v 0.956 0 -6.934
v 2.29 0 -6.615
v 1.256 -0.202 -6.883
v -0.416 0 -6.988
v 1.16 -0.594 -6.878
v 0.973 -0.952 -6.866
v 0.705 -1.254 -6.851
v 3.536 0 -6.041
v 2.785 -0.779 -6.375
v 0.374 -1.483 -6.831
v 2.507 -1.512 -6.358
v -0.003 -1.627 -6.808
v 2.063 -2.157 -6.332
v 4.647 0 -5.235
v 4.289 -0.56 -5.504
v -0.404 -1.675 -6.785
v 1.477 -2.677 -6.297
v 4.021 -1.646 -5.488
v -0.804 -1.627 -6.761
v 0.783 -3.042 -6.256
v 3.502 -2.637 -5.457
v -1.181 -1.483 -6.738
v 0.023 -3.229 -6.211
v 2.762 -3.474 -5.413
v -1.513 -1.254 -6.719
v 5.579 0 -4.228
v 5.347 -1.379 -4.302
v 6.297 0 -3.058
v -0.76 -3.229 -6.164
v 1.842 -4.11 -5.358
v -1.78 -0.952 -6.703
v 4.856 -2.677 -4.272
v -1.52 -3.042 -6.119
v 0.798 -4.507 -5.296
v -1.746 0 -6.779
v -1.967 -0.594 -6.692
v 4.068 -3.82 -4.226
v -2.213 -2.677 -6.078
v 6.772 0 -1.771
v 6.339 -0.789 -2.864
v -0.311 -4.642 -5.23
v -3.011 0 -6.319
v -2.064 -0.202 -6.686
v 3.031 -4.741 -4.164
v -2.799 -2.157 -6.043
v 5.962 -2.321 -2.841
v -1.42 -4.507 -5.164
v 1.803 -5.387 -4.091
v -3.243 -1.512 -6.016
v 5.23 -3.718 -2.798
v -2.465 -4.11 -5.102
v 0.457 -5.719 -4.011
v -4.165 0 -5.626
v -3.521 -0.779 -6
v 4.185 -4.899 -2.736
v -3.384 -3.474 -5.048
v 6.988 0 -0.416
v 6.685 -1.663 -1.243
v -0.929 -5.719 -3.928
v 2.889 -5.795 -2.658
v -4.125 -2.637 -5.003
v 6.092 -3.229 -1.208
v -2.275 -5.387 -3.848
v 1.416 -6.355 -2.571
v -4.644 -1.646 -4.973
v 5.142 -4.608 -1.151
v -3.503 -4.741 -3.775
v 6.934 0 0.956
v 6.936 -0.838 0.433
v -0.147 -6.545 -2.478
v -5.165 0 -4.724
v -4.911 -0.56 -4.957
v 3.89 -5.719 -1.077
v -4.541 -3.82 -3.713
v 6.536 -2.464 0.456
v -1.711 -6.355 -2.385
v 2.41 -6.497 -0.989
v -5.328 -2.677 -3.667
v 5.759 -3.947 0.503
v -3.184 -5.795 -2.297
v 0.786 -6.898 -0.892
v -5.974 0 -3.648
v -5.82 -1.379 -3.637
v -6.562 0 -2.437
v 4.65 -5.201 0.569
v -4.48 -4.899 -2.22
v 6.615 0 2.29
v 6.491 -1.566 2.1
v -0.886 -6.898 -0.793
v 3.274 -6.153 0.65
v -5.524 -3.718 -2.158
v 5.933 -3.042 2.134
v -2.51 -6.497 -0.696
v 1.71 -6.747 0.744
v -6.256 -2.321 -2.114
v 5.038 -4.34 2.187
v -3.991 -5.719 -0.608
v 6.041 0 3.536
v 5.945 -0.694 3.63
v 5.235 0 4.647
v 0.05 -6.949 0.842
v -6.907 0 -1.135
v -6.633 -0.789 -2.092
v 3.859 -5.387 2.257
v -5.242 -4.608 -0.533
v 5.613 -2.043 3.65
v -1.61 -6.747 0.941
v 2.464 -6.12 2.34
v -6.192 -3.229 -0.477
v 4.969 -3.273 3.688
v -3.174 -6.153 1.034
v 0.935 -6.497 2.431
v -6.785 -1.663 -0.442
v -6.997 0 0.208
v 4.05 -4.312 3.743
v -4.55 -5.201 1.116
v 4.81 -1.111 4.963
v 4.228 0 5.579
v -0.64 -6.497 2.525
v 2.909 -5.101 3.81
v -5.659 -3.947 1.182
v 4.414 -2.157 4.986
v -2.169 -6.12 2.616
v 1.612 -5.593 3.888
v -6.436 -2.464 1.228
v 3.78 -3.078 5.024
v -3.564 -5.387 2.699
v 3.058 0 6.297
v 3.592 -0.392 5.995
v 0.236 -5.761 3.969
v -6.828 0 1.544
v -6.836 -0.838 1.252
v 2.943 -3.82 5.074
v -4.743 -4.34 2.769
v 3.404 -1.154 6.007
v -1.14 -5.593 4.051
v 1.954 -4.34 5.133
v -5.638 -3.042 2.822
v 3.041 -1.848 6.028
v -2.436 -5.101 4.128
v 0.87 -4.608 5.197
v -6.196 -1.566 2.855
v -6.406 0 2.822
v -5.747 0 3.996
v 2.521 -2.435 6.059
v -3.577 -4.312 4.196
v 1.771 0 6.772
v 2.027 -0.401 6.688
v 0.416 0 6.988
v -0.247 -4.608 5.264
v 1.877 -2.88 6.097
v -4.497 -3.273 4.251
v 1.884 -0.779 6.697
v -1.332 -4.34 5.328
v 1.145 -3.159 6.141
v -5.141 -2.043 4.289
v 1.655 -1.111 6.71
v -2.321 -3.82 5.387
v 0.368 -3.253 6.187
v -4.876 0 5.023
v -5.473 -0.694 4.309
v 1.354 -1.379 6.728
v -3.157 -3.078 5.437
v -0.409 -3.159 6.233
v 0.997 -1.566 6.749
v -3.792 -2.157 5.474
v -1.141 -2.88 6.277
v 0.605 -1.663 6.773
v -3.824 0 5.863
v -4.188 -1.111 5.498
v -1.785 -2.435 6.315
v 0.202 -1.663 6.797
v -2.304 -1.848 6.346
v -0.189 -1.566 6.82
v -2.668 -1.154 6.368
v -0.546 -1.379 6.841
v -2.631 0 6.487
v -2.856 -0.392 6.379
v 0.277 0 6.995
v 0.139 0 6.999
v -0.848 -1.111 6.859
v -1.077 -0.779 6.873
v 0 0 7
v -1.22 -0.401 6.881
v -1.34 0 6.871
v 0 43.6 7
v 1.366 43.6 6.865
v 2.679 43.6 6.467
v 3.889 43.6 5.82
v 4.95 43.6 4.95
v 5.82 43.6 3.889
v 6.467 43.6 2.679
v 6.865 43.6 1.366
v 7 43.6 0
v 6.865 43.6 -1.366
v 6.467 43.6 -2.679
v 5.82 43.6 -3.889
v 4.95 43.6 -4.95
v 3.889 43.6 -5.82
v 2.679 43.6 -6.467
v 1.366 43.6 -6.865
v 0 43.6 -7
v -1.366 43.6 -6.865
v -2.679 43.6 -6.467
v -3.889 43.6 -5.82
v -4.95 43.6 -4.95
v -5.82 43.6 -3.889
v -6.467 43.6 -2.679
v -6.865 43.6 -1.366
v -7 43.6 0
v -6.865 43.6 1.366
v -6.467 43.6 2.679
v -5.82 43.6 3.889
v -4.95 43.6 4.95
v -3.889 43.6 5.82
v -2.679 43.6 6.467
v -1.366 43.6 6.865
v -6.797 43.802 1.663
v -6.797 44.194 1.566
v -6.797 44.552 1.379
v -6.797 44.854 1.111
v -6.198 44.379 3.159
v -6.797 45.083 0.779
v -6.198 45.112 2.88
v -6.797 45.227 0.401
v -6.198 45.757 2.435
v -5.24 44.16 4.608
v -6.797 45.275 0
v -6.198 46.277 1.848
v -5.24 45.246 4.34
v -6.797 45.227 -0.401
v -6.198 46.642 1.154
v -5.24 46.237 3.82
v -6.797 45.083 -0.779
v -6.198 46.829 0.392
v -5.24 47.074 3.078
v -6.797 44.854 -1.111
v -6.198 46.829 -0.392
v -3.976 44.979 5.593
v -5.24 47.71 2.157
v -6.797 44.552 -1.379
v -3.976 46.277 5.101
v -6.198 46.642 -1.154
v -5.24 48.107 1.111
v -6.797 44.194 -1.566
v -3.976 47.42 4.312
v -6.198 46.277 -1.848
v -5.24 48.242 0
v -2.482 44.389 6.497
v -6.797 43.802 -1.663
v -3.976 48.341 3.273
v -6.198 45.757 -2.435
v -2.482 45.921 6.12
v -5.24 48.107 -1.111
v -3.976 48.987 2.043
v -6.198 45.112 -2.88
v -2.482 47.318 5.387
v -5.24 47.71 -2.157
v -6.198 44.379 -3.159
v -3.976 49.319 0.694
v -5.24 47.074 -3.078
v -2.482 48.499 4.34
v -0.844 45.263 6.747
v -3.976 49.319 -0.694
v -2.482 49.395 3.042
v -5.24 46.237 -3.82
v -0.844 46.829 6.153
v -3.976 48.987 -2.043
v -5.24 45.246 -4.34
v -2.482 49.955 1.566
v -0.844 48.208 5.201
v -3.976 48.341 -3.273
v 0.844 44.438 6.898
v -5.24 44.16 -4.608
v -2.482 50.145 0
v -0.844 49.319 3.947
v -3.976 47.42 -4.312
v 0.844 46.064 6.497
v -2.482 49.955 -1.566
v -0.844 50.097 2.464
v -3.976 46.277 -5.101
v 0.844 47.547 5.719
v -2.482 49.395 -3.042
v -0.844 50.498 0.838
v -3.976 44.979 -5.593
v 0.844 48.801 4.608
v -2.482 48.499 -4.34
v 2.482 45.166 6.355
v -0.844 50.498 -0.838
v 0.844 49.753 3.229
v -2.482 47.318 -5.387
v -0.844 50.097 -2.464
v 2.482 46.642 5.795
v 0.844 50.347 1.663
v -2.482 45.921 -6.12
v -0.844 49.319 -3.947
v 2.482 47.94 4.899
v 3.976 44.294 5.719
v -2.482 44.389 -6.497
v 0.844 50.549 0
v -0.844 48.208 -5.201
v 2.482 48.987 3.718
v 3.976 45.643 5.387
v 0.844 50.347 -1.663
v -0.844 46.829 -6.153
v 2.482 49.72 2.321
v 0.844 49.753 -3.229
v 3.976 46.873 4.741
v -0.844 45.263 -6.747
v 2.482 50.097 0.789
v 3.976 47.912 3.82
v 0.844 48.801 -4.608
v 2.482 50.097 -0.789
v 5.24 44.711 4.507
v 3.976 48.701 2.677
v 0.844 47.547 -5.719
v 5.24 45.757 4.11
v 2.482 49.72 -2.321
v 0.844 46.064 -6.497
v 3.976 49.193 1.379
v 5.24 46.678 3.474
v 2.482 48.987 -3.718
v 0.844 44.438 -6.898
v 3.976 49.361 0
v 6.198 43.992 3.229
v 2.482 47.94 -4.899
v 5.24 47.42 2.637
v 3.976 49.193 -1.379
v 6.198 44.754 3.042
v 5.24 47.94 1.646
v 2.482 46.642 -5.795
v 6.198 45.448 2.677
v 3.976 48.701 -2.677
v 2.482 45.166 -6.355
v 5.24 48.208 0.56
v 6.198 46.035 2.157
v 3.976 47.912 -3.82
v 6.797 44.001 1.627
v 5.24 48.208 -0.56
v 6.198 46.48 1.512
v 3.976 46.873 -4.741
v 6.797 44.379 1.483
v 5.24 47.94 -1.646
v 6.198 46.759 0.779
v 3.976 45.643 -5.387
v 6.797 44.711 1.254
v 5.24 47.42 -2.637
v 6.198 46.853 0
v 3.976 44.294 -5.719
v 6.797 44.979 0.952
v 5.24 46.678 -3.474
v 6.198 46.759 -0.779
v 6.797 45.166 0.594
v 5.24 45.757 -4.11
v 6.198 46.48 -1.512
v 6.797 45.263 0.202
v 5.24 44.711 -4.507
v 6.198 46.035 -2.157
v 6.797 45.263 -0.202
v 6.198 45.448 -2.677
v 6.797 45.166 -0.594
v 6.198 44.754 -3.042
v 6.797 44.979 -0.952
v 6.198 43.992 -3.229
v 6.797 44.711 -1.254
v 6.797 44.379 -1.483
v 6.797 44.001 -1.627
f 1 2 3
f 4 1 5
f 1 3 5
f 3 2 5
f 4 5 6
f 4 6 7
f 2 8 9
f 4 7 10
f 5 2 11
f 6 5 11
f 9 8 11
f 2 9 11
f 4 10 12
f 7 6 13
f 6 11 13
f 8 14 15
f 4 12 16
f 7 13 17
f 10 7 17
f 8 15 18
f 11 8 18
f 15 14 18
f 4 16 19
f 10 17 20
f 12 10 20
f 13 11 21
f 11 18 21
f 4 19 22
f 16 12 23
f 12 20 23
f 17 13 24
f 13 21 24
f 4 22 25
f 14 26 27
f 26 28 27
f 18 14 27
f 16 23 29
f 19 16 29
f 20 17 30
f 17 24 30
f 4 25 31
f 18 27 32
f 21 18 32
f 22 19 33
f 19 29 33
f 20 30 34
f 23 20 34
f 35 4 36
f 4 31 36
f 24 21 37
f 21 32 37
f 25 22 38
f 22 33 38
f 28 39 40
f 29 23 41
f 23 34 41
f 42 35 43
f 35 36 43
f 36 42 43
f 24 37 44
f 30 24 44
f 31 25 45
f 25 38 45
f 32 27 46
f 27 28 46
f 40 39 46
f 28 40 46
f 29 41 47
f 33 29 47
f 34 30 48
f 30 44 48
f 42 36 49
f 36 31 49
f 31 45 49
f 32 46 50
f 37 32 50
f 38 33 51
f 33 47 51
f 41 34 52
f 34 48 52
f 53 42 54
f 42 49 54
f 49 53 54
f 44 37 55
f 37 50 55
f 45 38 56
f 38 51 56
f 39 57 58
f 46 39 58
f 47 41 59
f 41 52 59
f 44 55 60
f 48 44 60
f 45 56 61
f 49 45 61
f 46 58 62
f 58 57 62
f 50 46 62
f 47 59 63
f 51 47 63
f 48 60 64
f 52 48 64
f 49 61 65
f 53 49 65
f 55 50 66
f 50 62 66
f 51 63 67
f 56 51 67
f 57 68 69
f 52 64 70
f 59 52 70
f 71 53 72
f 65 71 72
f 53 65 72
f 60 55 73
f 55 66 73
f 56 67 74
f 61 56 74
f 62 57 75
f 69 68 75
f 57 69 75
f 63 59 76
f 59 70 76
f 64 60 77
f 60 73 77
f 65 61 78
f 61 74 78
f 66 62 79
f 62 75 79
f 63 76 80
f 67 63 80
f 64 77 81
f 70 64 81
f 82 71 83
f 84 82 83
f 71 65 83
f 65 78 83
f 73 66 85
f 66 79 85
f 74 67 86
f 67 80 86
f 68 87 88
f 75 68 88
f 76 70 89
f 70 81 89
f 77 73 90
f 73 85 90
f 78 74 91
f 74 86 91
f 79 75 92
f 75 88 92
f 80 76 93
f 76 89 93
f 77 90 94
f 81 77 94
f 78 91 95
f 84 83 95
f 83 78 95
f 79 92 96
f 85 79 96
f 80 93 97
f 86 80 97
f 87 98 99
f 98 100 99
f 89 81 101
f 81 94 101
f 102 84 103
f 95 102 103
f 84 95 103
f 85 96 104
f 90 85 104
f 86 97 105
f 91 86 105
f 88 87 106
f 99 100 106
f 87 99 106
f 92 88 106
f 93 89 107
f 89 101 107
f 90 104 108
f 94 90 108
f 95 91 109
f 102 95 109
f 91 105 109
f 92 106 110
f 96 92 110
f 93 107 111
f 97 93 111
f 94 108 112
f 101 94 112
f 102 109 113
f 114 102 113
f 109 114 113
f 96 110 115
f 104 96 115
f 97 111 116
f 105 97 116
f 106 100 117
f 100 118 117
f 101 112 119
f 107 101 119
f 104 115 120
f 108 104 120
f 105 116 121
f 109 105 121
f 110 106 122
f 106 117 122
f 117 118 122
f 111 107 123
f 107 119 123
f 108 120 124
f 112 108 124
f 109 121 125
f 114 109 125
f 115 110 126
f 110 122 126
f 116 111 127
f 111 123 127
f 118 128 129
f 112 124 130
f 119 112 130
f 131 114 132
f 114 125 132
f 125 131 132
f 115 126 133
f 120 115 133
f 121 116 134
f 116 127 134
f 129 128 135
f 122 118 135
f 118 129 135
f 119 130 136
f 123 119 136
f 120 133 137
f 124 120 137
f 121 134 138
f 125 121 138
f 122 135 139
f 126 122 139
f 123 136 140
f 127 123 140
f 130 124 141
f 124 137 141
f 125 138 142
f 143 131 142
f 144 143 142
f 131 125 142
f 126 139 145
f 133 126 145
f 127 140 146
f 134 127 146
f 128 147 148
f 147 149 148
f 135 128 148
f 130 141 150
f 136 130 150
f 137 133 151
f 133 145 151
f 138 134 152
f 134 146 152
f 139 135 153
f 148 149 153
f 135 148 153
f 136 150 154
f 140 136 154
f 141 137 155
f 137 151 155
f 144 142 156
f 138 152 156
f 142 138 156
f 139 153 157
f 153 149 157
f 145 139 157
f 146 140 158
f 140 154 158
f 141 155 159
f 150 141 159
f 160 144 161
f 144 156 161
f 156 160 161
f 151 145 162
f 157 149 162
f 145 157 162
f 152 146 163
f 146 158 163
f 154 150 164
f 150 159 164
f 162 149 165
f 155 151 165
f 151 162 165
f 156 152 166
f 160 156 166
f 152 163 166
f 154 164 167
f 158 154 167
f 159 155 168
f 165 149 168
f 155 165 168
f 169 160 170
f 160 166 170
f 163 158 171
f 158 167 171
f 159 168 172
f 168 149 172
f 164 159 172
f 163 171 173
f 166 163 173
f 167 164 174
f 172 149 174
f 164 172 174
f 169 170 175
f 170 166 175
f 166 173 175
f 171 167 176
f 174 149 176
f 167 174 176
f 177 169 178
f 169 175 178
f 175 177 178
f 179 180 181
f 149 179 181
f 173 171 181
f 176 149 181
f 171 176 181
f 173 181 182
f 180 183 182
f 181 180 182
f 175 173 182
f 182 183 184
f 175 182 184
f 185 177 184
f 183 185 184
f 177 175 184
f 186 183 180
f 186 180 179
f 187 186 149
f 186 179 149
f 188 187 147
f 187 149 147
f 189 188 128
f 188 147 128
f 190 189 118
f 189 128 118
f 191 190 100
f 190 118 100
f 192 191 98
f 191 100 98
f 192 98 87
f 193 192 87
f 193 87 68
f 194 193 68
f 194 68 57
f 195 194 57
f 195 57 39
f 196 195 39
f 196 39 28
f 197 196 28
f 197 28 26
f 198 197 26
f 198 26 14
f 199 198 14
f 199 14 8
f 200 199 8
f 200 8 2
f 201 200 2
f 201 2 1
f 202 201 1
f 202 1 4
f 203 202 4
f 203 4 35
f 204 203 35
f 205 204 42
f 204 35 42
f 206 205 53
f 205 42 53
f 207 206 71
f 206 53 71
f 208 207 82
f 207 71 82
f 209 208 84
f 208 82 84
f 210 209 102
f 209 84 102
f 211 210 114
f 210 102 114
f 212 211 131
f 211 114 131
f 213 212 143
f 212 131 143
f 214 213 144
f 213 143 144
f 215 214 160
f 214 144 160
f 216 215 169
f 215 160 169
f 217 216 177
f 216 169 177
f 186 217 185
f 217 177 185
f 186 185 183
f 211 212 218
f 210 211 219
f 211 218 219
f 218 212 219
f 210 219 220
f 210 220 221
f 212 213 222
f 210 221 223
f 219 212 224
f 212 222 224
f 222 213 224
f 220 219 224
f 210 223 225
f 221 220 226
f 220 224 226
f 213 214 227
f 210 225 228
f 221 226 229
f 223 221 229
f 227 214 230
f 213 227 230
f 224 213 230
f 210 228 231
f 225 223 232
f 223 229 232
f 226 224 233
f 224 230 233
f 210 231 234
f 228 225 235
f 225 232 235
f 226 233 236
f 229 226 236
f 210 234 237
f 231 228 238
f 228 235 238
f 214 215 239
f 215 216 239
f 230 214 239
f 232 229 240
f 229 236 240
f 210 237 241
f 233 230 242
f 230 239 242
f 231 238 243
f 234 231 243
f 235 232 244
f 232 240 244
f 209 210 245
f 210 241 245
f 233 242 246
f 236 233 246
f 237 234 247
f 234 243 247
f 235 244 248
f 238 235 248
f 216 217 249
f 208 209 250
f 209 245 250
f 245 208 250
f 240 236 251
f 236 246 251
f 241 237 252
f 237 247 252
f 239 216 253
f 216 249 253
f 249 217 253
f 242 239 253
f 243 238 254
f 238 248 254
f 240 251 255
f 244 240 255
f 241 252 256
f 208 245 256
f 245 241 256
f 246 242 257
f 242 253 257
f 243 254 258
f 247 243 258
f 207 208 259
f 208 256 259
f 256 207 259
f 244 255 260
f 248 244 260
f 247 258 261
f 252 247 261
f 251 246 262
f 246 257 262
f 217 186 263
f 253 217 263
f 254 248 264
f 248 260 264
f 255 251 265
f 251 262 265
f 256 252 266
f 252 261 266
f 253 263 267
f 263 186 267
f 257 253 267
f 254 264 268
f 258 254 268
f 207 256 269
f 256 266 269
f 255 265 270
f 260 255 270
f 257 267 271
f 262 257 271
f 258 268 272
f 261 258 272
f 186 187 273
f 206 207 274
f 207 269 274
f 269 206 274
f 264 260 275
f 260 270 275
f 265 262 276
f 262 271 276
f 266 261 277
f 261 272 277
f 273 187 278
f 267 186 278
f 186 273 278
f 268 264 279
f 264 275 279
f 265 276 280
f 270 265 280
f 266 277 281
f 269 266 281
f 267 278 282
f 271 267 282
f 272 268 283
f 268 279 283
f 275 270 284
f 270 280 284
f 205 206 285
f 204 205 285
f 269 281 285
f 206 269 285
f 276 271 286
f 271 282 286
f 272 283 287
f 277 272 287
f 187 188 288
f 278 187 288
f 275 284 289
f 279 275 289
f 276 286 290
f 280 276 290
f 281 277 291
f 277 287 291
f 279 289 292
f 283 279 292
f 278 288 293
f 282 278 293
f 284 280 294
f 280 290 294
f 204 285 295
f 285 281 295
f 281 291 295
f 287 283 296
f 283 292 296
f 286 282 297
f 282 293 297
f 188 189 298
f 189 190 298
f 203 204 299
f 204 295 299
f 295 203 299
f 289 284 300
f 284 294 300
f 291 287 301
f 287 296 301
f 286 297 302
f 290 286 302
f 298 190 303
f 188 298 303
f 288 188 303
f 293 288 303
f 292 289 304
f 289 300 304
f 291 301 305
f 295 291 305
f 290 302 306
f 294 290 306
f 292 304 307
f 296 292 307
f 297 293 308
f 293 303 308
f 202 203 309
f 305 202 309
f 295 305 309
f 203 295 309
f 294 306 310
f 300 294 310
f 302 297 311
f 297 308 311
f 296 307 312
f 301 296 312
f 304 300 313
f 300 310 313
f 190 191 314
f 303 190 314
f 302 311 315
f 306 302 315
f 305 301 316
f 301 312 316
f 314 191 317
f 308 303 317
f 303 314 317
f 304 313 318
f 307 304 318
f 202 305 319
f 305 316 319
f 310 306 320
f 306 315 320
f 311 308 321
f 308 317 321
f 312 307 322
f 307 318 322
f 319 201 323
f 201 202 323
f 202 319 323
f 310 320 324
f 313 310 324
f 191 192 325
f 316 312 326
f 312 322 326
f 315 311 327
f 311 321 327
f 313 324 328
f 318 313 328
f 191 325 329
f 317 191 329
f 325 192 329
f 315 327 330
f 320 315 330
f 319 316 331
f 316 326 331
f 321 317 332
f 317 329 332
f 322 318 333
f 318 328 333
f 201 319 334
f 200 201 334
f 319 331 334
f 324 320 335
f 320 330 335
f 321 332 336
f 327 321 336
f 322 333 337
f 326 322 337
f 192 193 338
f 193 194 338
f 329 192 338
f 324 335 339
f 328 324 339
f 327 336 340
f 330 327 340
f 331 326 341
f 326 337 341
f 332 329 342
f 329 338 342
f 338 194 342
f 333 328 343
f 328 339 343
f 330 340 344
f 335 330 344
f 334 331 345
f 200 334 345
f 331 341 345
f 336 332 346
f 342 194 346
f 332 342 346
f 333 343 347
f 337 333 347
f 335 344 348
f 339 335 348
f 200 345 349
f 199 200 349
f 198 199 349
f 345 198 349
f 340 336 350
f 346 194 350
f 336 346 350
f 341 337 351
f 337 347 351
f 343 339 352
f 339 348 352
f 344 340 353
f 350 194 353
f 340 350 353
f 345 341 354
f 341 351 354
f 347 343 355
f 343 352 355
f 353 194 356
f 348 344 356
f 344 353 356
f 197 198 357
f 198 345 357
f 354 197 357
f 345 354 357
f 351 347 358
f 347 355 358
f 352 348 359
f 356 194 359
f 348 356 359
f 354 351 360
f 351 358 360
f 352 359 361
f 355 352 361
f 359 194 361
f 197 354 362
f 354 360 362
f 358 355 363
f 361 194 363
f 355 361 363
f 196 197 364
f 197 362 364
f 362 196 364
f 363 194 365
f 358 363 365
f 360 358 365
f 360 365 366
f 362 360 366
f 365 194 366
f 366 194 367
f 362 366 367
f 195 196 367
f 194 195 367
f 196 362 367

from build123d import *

# Parameters (mm, degrees)
SCHIZZO1_R                   = 7
ESTRUSIONE_ESTRUSIONE1_DEPTH = 43.6
RIVOLUZIONE1_ANGLE           = 180
RIVOLUZIONE2_ANGLE           = 180


with BuildPart() as part:
    # Schizzo1 → Estrusione-Estrusione1 (new body)
    with BuildSketch(Plane(origin=(0, 0, 0), x_dir=(1, 0, 0), z_dir=(0, 1, 0))):
        with Locations(Location((0, 0, 0), (0, 0, 270))):
            Circle(SCHIZZO1_R)
    extrude(amount=ESTRUSIONE_ESTRUSIONE1_DEPTH)

    # Schizzo2 → Rivoluzione1 (revolve)
    with BuildSketch(Plane(origin=(0, 0, 0), x_dir=(-1, 0, 0), z_dir=(0, -1, 0))):
        with BuildLine():
            Line((-0.415700634, -6.98764574), (0.415700634, 6.98764574))
            ThreePointArc((0.415700634, 6.98764574), (-6.98764574, 0.415700634), (-0.415700634, -6.98764574))
        make_face()
    revolve(axis=Axis((0.415700634, 0, 6.98764574), (-0.05938580489346364, 0, -0.9982351056625666)), revolution_arc=RIVOLUZIONE1_ANGLE)

    # Schizzo3 → Rivoluzione2 (revolve)
    with BuildSketch(Plane(origin=(0, 43.6, 0), x_dir=(1, 0, 0), z_dir=(0, 1, 0))):
        with BuildLine():
            Line((7, 0), (-7, 0))
            ThreePointArc((-7, 0), (0, -7), (7, 0))
        make_face()
    revolve(axis=Axis((7, 43.6, 0), (-1, 0, 0)), revolution_arc=RIVOLUZIONE2_ANGLE)


solid = part.part
